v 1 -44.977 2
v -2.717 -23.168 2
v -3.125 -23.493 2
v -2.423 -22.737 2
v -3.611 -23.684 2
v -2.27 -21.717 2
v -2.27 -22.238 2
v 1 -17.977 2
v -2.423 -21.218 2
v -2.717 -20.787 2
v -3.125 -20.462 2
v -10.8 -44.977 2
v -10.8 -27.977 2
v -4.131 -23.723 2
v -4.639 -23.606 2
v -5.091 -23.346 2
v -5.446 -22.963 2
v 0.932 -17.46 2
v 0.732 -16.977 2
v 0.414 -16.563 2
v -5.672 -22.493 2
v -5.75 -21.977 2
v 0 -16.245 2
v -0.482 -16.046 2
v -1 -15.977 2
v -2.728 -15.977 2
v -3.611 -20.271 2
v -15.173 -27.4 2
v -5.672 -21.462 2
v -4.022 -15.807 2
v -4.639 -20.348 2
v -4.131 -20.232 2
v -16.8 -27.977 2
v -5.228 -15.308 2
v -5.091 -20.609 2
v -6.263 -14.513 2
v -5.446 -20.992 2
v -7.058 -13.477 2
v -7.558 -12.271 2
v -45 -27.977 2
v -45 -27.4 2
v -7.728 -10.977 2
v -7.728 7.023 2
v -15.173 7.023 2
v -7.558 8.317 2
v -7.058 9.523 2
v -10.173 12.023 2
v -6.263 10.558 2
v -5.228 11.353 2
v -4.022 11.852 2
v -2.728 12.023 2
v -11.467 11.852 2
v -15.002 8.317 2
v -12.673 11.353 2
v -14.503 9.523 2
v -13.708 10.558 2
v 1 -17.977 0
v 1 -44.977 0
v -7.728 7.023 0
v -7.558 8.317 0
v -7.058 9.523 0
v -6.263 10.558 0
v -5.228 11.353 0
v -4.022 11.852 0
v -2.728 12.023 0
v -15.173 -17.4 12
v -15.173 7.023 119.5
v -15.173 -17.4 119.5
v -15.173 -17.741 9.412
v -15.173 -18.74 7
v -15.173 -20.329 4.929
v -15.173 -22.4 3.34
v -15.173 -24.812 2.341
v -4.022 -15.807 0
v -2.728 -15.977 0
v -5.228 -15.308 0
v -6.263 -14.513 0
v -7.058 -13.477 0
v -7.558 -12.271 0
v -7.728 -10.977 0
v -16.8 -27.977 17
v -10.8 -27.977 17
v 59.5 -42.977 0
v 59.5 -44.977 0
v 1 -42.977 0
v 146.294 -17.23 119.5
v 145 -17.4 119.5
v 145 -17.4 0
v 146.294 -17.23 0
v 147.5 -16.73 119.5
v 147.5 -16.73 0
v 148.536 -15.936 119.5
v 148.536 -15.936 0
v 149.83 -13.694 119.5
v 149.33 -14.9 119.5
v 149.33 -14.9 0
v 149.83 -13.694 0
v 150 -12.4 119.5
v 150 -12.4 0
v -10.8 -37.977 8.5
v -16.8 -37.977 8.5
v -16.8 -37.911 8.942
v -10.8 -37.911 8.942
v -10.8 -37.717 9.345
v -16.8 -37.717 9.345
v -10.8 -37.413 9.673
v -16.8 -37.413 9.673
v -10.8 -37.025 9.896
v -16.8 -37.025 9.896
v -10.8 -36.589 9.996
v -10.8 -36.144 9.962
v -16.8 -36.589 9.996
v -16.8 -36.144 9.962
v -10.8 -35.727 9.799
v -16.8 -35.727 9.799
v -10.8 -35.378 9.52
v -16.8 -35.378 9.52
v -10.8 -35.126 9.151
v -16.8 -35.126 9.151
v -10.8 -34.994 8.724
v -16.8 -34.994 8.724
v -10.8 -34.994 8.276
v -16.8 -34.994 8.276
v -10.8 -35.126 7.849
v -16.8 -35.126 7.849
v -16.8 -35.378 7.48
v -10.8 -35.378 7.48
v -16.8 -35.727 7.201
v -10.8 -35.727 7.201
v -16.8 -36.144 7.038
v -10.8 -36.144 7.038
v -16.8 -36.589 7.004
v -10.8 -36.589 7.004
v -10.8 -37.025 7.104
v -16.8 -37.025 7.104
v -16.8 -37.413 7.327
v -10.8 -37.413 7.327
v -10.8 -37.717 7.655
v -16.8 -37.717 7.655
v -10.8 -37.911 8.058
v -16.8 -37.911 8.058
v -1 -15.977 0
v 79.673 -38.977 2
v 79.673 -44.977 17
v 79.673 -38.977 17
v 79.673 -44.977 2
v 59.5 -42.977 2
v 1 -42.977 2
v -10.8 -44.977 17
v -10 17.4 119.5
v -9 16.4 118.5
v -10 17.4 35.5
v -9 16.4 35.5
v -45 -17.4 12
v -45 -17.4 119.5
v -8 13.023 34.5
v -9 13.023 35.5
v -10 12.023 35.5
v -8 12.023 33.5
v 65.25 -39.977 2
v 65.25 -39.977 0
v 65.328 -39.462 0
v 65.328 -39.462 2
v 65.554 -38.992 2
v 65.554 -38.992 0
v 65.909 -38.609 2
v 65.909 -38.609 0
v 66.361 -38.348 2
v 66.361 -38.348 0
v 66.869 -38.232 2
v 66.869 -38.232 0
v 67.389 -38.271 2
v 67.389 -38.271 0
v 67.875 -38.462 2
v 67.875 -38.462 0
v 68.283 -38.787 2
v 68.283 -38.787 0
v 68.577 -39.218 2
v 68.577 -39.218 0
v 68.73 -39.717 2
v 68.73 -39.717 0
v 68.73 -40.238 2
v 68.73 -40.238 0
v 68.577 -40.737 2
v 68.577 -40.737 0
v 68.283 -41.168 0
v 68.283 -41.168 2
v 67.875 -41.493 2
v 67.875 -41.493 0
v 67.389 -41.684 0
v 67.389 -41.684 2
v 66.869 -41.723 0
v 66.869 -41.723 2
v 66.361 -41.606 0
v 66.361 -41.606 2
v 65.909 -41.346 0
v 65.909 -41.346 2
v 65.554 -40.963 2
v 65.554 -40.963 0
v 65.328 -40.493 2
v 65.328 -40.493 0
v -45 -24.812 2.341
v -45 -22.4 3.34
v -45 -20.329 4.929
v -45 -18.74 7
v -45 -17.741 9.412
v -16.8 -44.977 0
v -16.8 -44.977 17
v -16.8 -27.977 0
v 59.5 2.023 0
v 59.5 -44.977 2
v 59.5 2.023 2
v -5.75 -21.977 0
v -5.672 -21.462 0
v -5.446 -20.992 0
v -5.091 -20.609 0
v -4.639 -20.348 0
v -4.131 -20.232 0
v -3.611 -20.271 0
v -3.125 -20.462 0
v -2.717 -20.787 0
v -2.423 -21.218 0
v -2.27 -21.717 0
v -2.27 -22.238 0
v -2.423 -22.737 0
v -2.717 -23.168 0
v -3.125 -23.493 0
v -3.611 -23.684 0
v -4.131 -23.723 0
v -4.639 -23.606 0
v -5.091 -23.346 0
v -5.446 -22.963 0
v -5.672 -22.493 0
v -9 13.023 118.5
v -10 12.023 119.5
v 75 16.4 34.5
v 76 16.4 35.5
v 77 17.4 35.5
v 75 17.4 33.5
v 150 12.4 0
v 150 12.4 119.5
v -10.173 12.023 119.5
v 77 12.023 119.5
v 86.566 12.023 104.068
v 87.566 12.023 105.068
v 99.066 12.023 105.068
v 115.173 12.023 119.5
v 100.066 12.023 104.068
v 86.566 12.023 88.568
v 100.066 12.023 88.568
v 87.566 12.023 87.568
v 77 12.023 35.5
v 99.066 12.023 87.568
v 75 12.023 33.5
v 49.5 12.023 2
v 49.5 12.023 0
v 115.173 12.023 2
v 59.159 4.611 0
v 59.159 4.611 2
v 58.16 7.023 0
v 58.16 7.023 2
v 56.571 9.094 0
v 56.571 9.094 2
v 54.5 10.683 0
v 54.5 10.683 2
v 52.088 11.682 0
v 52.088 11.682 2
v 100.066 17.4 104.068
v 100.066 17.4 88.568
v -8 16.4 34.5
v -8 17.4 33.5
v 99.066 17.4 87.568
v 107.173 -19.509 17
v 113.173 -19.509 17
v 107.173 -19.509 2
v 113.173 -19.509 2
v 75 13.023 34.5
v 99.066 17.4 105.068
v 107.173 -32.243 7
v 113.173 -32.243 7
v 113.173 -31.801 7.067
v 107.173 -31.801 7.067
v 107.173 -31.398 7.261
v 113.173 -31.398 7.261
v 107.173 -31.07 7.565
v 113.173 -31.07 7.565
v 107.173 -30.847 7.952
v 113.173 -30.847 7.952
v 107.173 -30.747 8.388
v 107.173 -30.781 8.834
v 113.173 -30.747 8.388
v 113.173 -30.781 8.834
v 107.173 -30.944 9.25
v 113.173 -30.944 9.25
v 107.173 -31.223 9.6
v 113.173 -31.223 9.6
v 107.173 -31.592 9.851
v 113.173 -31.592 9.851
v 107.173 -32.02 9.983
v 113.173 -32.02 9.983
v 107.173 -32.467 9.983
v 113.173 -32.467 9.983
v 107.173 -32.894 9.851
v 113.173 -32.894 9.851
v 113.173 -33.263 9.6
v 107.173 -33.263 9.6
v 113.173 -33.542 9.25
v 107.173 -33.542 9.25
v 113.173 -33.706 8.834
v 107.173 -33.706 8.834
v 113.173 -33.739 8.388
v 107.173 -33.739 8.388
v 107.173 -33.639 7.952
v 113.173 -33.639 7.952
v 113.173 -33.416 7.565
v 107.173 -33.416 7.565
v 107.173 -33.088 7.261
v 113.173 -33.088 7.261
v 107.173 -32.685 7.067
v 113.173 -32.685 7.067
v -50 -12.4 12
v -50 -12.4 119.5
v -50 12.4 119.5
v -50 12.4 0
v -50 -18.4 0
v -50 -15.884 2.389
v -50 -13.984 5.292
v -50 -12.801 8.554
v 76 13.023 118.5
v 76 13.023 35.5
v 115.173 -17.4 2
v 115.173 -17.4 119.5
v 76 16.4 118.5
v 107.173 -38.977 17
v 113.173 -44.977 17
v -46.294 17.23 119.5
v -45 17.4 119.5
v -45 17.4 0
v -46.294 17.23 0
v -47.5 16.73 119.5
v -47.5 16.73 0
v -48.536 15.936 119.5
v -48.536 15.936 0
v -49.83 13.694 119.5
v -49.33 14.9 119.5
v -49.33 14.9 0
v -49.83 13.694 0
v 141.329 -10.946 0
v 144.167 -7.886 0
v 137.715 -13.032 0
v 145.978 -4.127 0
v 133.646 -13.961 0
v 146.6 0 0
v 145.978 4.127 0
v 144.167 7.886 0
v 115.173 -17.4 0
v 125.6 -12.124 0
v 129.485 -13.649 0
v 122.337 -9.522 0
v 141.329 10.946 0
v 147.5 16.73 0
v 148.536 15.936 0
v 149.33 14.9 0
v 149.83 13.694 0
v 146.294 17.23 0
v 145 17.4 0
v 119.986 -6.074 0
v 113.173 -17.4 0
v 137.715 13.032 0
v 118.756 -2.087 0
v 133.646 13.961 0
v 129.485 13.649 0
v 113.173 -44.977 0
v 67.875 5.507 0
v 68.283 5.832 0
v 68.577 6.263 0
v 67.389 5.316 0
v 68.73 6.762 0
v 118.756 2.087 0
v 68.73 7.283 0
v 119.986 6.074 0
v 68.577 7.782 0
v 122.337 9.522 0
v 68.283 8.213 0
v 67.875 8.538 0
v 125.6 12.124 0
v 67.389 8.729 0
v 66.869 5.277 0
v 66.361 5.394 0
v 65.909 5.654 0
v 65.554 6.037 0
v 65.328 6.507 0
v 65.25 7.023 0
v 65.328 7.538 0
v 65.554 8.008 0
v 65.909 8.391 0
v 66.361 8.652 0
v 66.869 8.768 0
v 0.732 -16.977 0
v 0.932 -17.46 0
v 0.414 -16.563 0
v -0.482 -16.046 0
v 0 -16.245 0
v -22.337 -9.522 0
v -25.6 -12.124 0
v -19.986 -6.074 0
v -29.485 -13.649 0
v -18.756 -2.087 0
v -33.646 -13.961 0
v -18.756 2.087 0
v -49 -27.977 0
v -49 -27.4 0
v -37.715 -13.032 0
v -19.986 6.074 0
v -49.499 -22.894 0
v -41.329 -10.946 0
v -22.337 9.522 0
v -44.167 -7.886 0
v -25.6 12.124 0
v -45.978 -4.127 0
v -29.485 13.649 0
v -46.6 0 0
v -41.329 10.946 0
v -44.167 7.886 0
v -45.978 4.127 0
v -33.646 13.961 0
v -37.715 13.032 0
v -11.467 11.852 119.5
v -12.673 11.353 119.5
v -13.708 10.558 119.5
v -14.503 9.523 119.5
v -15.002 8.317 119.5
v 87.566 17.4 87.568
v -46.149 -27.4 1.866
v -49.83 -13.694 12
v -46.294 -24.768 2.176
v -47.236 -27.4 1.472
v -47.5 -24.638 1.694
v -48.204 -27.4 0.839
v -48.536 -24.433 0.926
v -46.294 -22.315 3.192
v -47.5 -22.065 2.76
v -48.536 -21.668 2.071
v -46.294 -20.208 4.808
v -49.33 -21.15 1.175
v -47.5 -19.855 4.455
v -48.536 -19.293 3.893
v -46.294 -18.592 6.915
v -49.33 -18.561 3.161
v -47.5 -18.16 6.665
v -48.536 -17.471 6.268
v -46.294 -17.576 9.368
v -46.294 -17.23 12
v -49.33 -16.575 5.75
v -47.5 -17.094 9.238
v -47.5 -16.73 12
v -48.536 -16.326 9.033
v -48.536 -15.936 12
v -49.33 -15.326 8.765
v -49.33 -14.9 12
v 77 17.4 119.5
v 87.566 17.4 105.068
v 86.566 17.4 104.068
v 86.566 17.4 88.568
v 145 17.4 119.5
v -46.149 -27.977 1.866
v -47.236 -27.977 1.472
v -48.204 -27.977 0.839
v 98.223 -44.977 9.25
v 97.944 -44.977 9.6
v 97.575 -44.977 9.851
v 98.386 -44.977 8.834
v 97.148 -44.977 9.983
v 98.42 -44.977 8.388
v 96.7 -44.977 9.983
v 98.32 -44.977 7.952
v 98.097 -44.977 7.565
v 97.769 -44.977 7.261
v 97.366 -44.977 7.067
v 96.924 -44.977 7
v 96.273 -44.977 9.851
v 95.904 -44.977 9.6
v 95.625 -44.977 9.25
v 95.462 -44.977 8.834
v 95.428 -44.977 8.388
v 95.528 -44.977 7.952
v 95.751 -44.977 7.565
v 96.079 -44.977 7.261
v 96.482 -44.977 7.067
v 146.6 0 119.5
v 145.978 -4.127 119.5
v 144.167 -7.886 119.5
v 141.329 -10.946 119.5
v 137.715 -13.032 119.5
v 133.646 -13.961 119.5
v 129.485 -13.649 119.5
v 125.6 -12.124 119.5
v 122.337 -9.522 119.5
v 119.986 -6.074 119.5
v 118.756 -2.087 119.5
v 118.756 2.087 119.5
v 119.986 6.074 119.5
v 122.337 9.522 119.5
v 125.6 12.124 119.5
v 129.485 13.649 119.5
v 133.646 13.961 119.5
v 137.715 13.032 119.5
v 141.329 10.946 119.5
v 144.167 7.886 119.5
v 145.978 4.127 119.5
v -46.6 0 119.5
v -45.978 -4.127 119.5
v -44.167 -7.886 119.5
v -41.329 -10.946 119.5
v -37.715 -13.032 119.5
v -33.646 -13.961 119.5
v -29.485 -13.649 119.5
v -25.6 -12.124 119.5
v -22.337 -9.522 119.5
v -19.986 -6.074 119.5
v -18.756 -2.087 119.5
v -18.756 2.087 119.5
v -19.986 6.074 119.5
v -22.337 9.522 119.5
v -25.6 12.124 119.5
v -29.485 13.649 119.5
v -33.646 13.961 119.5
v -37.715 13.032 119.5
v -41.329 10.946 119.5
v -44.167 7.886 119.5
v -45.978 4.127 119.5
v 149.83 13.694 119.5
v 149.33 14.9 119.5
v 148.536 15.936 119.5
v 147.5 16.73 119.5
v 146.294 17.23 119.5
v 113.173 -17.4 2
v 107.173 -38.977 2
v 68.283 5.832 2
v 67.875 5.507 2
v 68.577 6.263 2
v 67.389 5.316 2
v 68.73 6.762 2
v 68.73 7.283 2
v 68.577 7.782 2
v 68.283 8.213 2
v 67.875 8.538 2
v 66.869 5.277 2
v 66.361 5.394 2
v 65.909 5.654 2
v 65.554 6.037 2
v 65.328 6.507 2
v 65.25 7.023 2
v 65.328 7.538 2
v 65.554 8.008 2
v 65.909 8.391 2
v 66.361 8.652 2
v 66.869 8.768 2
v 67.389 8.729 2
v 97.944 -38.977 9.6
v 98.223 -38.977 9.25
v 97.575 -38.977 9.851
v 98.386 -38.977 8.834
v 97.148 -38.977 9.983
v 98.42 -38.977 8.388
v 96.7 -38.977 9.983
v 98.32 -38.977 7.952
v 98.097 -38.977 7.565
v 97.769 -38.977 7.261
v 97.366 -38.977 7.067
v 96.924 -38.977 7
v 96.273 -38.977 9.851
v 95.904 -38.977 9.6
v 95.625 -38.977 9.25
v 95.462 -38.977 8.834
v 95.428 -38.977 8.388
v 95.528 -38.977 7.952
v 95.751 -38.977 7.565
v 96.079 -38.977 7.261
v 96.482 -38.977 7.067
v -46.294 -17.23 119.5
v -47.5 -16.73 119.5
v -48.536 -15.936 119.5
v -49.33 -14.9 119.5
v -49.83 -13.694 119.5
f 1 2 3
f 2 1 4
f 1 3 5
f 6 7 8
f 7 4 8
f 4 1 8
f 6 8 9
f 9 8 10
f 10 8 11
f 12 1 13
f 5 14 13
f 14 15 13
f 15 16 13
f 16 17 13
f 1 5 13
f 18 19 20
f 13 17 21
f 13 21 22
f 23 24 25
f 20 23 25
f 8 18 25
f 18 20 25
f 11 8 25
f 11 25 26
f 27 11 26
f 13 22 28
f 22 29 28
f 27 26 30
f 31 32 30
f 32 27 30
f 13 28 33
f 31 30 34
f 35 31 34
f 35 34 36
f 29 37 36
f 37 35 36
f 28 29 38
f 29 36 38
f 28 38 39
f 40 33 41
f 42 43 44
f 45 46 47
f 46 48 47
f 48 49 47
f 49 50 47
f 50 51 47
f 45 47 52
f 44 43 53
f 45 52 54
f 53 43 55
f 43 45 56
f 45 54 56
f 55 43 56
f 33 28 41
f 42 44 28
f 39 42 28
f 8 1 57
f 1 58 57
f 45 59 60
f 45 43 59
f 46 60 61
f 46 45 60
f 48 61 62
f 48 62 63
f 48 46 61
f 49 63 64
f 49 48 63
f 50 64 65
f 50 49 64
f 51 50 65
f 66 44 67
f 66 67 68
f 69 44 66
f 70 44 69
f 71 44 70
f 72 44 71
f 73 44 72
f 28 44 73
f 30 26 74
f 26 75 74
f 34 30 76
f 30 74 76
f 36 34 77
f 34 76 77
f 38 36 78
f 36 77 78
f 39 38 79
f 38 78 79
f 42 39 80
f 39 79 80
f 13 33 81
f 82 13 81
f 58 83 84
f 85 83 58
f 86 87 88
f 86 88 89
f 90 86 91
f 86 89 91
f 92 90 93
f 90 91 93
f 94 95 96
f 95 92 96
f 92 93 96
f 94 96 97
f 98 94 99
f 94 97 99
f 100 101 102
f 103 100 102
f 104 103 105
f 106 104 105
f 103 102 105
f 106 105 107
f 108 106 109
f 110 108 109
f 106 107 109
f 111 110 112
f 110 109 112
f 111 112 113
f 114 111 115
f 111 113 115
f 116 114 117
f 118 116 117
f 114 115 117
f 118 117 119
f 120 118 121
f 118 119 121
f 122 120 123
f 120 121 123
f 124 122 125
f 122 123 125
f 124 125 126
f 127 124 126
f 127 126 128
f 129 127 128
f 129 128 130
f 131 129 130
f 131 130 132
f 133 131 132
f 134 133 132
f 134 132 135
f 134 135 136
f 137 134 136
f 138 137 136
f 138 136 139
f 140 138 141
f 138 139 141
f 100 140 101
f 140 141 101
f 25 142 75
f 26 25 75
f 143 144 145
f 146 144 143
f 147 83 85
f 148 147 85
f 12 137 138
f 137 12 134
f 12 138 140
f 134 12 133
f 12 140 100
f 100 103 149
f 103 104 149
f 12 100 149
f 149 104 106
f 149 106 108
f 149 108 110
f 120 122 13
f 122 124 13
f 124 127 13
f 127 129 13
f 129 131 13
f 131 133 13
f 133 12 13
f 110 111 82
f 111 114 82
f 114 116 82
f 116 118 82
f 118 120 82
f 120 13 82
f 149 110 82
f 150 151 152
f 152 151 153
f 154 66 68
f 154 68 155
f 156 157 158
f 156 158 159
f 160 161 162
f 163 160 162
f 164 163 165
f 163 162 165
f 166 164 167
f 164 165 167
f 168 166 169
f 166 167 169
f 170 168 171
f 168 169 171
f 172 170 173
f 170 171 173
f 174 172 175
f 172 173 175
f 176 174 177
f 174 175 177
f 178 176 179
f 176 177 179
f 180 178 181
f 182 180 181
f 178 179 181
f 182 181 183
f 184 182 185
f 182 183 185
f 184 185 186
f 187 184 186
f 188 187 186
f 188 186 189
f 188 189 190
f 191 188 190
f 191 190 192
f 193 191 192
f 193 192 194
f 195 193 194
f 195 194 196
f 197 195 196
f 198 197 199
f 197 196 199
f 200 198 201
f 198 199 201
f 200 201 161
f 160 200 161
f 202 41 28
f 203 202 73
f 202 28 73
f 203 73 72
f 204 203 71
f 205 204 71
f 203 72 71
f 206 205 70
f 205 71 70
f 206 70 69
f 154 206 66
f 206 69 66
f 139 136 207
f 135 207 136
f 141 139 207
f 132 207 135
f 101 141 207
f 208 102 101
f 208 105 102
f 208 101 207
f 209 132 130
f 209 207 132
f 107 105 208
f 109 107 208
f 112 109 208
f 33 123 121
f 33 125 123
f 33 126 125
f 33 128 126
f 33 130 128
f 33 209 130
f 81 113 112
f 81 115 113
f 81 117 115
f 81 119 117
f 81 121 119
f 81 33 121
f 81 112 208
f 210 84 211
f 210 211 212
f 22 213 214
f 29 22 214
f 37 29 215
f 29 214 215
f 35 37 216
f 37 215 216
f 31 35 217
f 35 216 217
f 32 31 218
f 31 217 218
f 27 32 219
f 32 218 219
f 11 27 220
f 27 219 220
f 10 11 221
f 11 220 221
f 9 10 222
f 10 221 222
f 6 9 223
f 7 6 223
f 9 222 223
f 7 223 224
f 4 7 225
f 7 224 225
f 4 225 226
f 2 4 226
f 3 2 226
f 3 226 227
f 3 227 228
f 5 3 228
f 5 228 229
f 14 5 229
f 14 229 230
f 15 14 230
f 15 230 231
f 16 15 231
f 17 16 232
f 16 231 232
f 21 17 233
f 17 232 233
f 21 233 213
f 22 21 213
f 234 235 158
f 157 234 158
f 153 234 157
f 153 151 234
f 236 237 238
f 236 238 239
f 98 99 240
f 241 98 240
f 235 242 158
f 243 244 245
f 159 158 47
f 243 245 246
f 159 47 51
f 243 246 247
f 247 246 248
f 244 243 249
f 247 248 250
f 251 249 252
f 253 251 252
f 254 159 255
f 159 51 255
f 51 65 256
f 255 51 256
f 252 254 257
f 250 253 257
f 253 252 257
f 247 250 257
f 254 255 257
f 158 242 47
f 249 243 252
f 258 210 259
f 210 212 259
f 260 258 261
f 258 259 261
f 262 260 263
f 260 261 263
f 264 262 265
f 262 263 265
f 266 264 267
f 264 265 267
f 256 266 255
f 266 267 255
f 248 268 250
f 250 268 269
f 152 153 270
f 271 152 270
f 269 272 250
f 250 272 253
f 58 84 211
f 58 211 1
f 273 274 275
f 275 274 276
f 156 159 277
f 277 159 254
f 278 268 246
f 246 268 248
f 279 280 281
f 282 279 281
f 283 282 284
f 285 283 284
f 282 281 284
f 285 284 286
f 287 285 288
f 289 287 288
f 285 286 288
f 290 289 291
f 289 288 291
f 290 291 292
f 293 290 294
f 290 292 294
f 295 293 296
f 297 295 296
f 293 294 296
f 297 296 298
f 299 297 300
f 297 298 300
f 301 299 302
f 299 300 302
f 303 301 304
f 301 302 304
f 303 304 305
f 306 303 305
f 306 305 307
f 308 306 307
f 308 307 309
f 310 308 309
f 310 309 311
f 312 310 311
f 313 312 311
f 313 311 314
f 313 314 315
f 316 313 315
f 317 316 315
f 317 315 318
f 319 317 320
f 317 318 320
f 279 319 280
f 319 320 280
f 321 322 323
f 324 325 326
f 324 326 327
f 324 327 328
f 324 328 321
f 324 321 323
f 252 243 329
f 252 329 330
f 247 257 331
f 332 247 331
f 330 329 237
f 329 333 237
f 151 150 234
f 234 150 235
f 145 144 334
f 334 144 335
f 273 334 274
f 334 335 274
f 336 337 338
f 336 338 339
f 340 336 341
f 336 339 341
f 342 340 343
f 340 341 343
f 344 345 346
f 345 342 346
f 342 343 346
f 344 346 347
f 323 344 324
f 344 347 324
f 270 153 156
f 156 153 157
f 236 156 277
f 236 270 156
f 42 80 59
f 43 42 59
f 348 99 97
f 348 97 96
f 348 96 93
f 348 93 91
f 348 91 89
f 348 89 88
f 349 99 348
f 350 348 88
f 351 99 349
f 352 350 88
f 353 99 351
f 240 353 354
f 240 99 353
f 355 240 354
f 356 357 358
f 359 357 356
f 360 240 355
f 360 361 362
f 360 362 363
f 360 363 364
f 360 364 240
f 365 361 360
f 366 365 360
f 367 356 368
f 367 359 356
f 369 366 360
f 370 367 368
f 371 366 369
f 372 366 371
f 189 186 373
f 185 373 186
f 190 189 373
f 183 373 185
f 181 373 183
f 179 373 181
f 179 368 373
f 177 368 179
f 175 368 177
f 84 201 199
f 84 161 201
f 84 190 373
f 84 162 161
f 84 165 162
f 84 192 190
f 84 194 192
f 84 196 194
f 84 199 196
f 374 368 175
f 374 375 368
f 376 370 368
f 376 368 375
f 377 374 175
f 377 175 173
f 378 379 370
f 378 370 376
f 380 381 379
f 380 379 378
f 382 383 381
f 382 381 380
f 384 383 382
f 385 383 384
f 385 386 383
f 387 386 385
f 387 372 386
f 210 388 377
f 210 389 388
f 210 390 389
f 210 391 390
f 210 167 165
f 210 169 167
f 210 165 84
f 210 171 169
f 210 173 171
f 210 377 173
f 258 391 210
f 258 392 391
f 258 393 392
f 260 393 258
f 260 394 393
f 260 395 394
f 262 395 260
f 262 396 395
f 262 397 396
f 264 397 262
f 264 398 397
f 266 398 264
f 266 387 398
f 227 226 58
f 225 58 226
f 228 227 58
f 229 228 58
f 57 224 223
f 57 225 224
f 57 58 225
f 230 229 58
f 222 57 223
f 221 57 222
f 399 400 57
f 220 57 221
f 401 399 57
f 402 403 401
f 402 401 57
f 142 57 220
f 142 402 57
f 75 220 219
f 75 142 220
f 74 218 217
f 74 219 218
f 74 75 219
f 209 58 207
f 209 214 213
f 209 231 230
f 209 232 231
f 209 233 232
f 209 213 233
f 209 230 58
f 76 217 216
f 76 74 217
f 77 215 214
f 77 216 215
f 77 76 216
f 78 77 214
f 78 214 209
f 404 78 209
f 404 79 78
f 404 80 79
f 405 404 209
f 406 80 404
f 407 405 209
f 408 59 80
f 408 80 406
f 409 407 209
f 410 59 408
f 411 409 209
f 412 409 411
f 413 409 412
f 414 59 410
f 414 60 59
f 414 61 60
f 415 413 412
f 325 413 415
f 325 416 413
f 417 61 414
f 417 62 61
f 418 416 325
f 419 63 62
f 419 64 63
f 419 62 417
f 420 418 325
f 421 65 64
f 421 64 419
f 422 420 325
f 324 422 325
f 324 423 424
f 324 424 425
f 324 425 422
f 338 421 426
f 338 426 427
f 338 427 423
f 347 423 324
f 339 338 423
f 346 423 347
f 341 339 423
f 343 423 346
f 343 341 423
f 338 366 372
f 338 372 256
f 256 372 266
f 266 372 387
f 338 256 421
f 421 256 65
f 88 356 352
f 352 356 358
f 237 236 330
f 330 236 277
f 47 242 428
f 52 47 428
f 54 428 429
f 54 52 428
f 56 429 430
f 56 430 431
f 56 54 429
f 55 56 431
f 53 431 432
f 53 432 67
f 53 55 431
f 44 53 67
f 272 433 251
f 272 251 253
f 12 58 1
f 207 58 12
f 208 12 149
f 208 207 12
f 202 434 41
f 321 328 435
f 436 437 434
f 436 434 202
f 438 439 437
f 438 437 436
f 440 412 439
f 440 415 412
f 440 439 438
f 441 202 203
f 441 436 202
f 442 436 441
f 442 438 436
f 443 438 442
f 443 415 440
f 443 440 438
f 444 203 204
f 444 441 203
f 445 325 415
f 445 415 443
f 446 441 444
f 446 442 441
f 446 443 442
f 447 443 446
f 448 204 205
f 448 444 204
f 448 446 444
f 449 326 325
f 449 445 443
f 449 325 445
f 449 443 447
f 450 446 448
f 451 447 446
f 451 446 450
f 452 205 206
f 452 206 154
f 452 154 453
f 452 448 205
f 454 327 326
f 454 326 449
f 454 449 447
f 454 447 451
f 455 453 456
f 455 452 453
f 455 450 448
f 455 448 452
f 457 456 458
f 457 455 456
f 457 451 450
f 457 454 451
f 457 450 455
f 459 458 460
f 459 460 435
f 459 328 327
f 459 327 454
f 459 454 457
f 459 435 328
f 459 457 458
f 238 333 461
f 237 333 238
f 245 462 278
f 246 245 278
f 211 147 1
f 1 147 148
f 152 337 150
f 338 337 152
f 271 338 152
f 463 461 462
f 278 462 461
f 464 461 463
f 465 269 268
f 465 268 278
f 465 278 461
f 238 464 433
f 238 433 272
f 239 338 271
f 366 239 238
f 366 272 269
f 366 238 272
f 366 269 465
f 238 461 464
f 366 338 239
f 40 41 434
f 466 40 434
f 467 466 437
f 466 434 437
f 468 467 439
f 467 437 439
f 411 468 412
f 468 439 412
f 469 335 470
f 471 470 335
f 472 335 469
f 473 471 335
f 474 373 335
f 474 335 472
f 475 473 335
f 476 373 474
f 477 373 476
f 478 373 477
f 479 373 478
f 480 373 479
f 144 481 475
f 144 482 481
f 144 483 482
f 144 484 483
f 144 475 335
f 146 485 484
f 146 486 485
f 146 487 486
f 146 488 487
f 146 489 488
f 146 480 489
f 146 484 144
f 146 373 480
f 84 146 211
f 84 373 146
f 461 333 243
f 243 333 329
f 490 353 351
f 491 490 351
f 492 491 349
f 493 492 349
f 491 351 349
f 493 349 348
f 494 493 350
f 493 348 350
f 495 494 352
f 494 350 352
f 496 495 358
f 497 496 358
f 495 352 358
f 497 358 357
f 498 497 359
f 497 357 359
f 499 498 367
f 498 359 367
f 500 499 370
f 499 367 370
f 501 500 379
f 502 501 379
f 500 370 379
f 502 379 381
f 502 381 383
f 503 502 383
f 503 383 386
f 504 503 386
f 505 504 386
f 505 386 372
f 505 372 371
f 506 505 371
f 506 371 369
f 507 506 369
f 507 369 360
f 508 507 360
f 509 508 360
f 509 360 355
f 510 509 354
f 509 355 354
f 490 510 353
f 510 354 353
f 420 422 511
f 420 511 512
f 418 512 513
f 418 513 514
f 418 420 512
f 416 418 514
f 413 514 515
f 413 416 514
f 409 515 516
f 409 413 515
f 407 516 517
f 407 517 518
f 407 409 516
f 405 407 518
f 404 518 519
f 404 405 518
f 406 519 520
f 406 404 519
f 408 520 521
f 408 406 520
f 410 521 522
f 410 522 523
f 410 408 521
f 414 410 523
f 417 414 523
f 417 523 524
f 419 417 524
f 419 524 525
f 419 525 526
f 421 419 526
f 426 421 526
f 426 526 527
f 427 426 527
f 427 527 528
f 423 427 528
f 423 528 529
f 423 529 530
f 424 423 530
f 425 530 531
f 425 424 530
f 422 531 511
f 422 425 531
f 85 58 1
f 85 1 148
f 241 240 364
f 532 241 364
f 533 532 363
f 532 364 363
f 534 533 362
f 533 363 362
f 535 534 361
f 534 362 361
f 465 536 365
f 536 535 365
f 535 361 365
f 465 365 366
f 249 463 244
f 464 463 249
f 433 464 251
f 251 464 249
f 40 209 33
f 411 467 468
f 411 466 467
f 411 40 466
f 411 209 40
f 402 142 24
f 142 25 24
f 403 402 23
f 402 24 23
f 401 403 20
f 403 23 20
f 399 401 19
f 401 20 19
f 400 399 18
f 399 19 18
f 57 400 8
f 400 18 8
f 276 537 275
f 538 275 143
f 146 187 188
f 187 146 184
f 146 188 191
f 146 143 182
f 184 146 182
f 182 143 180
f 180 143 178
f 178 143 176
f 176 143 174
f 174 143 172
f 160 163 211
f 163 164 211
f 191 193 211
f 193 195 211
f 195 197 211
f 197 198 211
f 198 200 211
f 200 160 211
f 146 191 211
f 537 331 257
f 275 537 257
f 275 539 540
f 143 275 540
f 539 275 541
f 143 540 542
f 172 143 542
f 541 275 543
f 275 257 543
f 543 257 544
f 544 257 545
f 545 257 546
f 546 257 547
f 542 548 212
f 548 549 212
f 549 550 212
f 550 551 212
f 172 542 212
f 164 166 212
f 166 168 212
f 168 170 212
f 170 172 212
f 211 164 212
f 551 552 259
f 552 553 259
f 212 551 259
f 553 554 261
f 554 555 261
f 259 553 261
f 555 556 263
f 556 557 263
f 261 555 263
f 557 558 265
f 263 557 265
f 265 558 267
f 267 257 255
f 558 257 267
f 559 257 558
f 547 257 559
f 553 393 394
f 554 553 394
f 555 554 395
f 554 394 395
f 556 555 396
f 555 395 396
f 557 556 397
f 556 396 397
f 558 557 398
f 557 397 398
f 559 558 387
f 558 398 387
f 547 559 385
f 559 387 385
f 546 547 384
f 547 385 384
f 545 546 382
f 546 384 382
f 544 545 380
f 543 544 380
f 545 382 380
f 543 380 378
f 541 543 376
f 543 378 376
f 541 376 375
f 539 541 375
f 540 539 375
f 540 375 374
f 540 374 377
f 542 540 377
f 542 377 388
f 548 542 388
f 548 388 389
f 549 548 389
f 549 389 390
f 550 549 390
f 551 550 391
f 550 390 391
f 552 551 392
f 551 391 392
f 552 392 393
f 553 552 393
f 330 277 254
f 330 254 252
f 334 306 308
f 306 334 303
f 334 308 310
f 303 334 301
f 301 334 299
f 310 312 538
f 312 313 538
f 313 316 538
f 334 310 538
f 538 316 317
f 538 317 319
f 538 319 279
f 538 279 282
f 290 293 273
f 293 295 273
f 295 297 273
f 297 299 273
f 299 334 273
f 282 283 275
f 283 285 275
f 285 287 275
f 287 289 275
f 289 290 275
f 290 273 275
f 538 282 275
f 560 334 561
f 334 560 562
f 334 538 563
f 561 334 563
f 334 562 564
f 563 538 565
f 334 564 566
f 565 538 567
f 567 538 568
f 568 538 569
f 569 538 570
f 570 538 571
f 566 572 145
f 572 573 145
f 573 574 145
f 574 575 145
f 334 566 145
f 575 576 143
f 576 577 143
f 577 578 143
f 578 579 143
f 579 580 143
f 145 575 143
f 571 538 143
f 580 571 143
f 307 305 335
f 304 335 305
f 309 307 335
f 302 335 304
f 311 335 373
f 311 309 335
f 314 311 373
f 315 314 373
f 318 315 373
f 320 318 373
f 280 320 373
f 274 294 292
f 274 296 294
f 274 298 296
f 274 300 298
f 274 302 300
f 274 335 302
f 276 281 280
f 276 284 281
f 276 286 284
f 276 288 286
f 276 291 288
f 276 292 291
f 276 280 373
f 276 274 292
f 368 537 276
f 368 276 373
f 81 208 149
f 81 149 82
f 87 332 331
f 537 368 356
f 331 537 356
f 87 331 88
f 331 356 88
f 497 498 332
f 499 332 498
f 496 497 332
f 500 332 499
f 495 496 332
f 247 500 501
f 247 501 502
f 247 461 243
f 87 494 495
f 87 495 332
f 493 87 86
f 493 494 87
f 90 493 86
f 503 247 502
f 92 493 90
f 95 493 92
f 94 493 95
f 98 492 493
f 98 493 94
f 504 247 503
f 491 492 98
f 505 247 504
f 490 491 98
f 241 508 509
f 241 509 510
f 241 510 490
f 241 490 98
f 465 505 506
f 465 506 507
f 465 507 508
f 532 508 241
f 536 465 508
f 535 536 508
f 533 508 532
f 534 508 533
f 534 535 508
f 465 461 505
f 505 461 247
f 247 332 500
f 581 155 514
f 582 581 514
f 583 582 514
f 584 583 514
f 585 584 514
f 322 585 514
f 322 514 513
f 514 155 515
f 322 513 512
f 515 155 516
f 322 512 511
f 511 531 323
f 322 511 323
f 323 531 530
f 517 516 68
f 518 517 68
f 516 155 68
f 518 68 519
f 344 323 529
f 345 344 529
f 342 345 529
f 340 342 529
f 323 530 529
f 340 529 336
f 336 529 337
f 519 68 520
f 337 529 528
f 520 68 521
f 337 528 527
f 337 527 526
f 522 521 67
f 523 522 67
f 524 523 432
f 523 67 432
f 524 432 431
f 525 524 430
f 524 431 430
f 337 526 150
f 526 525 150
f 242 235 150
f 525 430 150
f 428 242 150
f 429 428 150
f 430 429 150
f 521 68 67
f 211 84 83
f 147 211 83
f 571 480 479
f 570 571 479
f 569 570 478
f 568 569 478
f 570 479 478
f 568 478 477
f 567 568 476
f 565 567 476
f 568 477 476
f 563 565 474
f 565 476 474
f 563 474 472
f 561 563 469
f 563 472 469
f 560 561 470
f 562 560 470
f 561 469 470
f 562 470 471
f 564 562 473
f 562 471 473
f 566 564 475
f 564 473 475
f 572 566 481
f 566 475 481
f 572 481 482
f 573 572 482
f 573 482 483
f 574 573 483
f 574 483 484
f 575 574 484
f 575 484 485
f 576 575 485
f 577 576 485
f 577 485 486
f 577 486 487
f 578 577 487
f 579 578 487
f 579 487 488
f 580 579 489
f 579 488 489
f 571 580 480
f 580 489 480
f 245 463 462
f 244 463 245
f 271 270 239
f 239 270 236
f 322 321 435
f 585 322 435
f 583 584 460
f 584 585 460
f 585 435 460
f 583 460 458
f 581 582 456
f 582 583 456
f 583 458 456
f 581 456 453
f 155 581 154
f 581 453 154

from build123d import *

# Parameters (mm, degrees)
SKETCH1_R            = 14
BOSS_EXTRUDE1_DEPTH  = 119.5
SKETCH5_W            = 85
SKETCH5_H            = 85
CUT_EXTRUDE2_DEPTH   = 10
CHAMFER2_SIZE        = 1
SKETCH6_W            = 15
SKETCH6_H            = 57
SKETCH6_W_2          = 51
SKETCH6_H_2          = 12
BOSS_EXTRUDE3_DEPTH  = 2
SKETCH7_R            = 1.75
CUT_EXTRUDE3_DEPTH   = 2
FILLET1_R            = 10
FILLET2_R            = 10
SKETCH8_W            = 13.5
SKETCH8_H            = 17.5
CUT_EXTRUDE4_DEPTH   = 10
CHAMFER4_SIZE        = 1
SKETCH10_W           = 9.140808063
SKETCH10_H           = 30.26858539
BOSS_EXTRUDE4_DEPTH  = 2
FILLET3_R            = 5
FILLET4_R            = 5
FILLET5_R            = 5
SKETCH11_W           = 40.67275181
SKETCH11_H           = 57
BOSS_EXTRUDE5_DEPTH  = 2
SKETCH13_W           = 35.5
SKETCH13_H           = 15
BOSS_EXTRUDE6_DEPTH  = 6
SKETCH14_W           = 2
SKETCH14_H           = 27.577394829
CUT_EXTRUDE5_DEPTH   = 17
SKETCH15_W           = 17.8
SKETCH15_H           = 17
BOSS_EXTRUDE7_DEPTH  = 2
SKETCH16_W           = 15
SKETCH16_H           = 17
BOSS_EXTRUDE8_DEPTH  = 6
FILLET6_R            = 2
SKETCH17_W           = 58.5
SKETCH17_H           = 2
BOSS_EXTRUDE9_DEPTH  = 2
SKETCH18_W           = 15
SKETCH18_H           = 19.468455061
BOSS_EXTRUDE10_DEPTH = 6
SKETCH19_R           = 1.5
CUT_EXTRUDE6_DEPTH   = 6
SKETCH21_R           = 1.5
CUT_EXTRUDE7_DEPTH   = 6
SKETCH22_R           = 1.5
CUT_EXTRUDE8_DEPTH   = 6


with BuildPart() as part:
    # Sketch1 → Boss-Extrude1 (new body)
    with BuildSketch(Plane.XY):
        Polygon((-50, 17.4), (-15.2, 17.4), (50, 17.4), (50, 12.022605171), (-15.17275181, 12.022605171), (-15.17275181, -17.4), (-50, -17.4), align=None)
        with Locations(Location((-32.6, 0, 0), (0, 0, 180))):
            Circle(SKETCH1_R, mode=Mode.SUBTRACT)
    boss_extrude1 = extrude(amount=BOSS_EXTRUDE1_DEPTH)

    # Mirror1: Boss-Extrude1 across plane
    add(boss_extrude1.mirror(Plane(origin=(50, 17.4, 119.5), x_dir=(0, 0, 1), z_dir=(-1, 0, 0))))

    # Sketch5 → Cut-Extrude2 (cut)
    with BuildSketch(Plane(origin=(0, 17.4, 0), x_dir=(1, 0, 0), z_dir=(0, 1, 0))):
        with Locations((33.5, -77)):
            Rectangle(SKETCH5_W, SKETCH5_H)
    extrude(amount=-CUT_EXTRUDE2_DEPTH, mode=Mode.SUBTRACT)

    # Chamfer2
    chamfer2_edges = [part.edges().sort_by_distance(p)[0] for p in [
        (-9, 12.022605171, 77),
        (-9, 14.711302586, 119.5),
        (33.5, 12.022605171, 34.5),
        (-9, 14.711302586, 34.5),
        (76, 12.022605171, 77),
        (76, 14.711302586, 34.5),
        (76, 14.711302586, 119.5),
        (-9, 17.4, 77),
        (76, 17.4, 77),
        (33.5, 17.4, 34.5),
    ]]
    chamfer(chamfer2_edges, length=CHAMFER2_SIZE)

    # Sketch6 → Boss-Extrude3 (add)
    with BuildSketch(Plane(origin=(0, 0, 0), x_dir=(-1, 0, 0), z_dir=(0, 0, -1))):
        with Locations((-67, -16.477394829)):
            Rectangle(SKETCH6_W, SKETCH6_H)
        with Locations((24.5, -21.977394829)):
            Rectangle(SKETCH6_W_2, SKETCH6_H_2)
    extrude(amount=-BOSS_EXTRUDE3_DEPTH)

    # Sketch7 → Cut-Extrude3 (cut)
    with BuildSketch(Plane(origin=(0, 0, 0), x_dir=(-1, 0, 0), z_dir=(0, 0, -1))):
        with Locations((4, -21.977394829)):
            Circle(SKETCH7_R)
        with Locations((-67, 7.022605171)):
            Circle(SKETCH7_R)
        with Locations((-67, -39.977394829)):
            Circle(SKETCH7_R)
    extrude(amount=-CUT_EXTRUDE3_DEPTH, mode=Mode.SUBTRACT)

    # Fillet1
    fillet1_edges = [part.edges().sort_by_distance(p)[0] for p in [
        (-32.586375905, -17.4, 2),
    ]]
    fillet(fillet1_edges, radius=FILLET1_R)

    # Fillet2
    fillet2_edges = [part.edges().sort_by_distance(p)[0] for p in [
        (59.5, 12.022605171, 1),
    ]]
    fillet(fillet2_edges, radius=FILLET2_R)

    # Sketch8 → Cut-Extrude4 (cut)
    with BuildSketch(Plane(origin=(0, 17.4, 0), x_dir=(1, 0, 0), z_dir=(0, 1, 0))):
        with Locations((93.315639073, -96.31798342)):
            Rectangle(SKETCH8_W, SKETCH8_H)
    extrude(amount=-CUT_EXTRUDE4_DEPTH, mode=Mode.SUBTRACT)

    # Chamfer4
    chamfer4_edges = [part.edges().sort_by_distance(p)[0] for p in [
        (86.565639073, 14.711302586, 105.06798342),
        (86.565639073, 14.711302586, 87.56798342),
        (100.065639073, 14.711302586, 87.56798342),
        (100.065639073, 14.711302586, 105.06798342),
    ]]
    chamfer(chamfer4_edges, length=CHAMFER4_SIZE)

    # Sketch10 → Boss-Extrude4 (add)
    with BuildSketch(Plane(origin=(0, 0, 0), x_dir=(-1, 0, 0), z_dir=(0, 0, -1))):
        with Locations((12.298347732, -2.03609998)):
            Rectangle(SKETCH10_W, SKETCH10_H)
    extrude(amount=-BOSS_EXTRUDE4_DEPTH)

    # Fillet3
    fillet3_edges = [part.edges().sort_by_distance(p)[0] for p in [
        (-7.7279437, -15.977394829, 1),
    ]]
    fillet(fillet3_edges, radius=FILLET3_R)

    # Fillet4
    fillet4_edges = [part.edges().sort_by_distance(p)[0] for p in [
        (-7.7279437, 12.022605171, 1),
    ]]
    fillet(fillet4_edges, radius=FILLET4_R)

    # Fillet5
    # the kernel refuses this fillet: 5 mm, written as the material it adds along each edge
    with BuildSketch(Plane(origin=(-15.17275181, 12.022605171, 2), x_dir=(0, -1, 0), z_dir=(0, 0, 1))) as fillet5_piece_1:
        with BuildLine():
            CenterArc((FILLET5_R, FILLET5_R), FILLET5_R, 180, 90)
            Line((0, FILLET5_R), (0, 0))
            Line((0, 0), (FILLET5_R, 0))
        make_face()
    extrude(amount=117.5)
    # the kernel refuses this fillet: 5 mm, written as the material it takes off along each edge
    with BuildSketch(Plane(origin=(150, 17.4, -12.5), x_dir=(-1, 0, 0), z_dir=(0, 0, 1)), Plane(origin=(150, -17.4, -12.5), x_dir=(0, 1, 0), z_dir=(0, 0, 1)), Plane(origin=(-50, 17.4, -12.5), x_dir=(0, -1, 0), z_dir=(0, 0, 1))) as fillet5_2_piece_1:
        with BuildLine():
            CenterArc((FILLET5_R, FILLET5_R), FILLET5_R, 180, 90)
            Line((0, FILLET5_R), (0, 0))
            Line((0, 0), (FILLET5_R, 0))
        make_face()
    extrude(amount=144.5, mode=Mode.SUBTRACT)
    with BuildSketch(Plane(origin=(-50, -27.4, 2), x_dir=(0, 0, -1), z_dir=(0, -1, 0))) as fillet5_2_piece_2:
        with BuildLine():
            CenterArc((FILLET5_R, FILLET5_R), FILLET5_R, 180, 90)
            Line((0, FILLET5_R), (0, 0))
            Line((0, 0), (FILLET5_R, 0))
        make_face()
    extrude(amount=13.077394829, mode=Mode.SUBTRACT)
    with BuildSketch(Plane(origin=(-50, -27.4, 12), x_dir=(0, 0, -1), z_dir=(0, -1, 0))) as fillet5_2_piece_3:
        with BuildLine():
            CenterArc((10 + FILLET5_R, FILLET5_R), FILLET5_R, 180, 90)
            Line((10, FILLET5_R), (10, 0))
            Line((10, 0), (10 + FILLET5_R, 0))
        make_face()
    revolve(axis=Axis((-50, -27.4, 12), (1, 0, 0)), revolution_arc=90, mode=Mode.SUBTRACT)
    with BuildSketch(Plane(origin=(-50, -17.4, 12), x_dir=(0, 1, 0), z_dir=(0, 0, 1))) as fillet5_2_piece_4:
        with BuildLine():
            CenterArc((FILLET5_R, -FILLET5_R), FILLET5_R, 90, 90)
            Line((0, -FILLET5_R), (0, 0))
            Line((0, 0), (FILLET5_R, 0))
        make_face()
    extrude(amount=120, mode=Mode.SUBTRACT)

    # Sketch11 → Boss-Extrude5 (add)
    with BuildSketch(Plane(origin=(0, 0, 0), x_dir=(-1, 0, 0), z_dir=(0, 0, -1))):
        with Locations((-94.836375905, -16.477394829)):
            Rectangle(SKETCH11_W, SKETCH11_H)
    extrude(amount=-BOSS_EXTRUDE5_DEPTH)

    # Sketch13 → Boss-Extrude6 (add)
    with BuildSketch(Plane(origin=(0, -44.977394829, 0), x_dir=(-1, 0, 0), z_dir=(0, -1, 0))):
        with Locations((-97.42275181, -9.5)):
            Rectangle(SKETCH13_W, SKETCH13_H)
    extrude(amount=-BOSS_EXTRUDE6_DEPTH)

    # Sketch14 → Cut-Extrude5 (cut)
    with BuildSketch(Plane(origin=(0, 0, 0), x_dir=(-1, 0, 0), z_dir=(0, 0, -1))):
        with Locations((-114.17275181, -31.188697415)):
            Rectangle(SKETCH14_W, SKETCH14_H)
    extrude(amount=-CUT_EXTRUDE5_DEPTH, mode=Mode.SUBTRACT)

    # Sketch15 → Boss-Extrude7 (add)
    with BuildSketch(Plane(origin=(0, 0, 0), x_dir=(-1, 0, 0), z_dir=(0, 0, -1))):
        with Locations((7.9, -36.477394829)):
            Rectangle(SKETCH15_W, SKETCH15_H)
    extrude(amount=-BOSS_EXTRUDE7_DEPTH)

    # Sketch16 → Boss-Extrude8 (add)
    with BuildSketch(Plane.ZY.offset(16.8)):
        with Locations((9.5, -36.477394829)):
            Rectangle(SKETCH16_W, SKETCH16_H)
    extrude(amount=-BOSS_EXTRUDE8_DEPTH)

    # Fillet6
    fillet6_edges = [part.edges().sort_by_distance(p)[0] for p in [
        (1, -15.977394829, 1),
    ]]
    fillet(fillet6_edges, radius=FILLET6_R)

    # Sketch18 → Boss-Extrude10 (add)
    with BuildSketch(Plane(origin=(113.17275181, 0, 0), x_dir=(0, 0, -1), z_dir=(1, 0, 0))):
        with Locations((-9.5, -29.243167299)):
            Rectangle(SKETCH18_W, SKETCH18_H)
    extrude(amount=-BOSS_EXTRUDE10_DEPTH)

    # Sketch19 → Cut-Extrude6 (cut)
    with BuildSketch(Plane(origin=(113.17275181, 0, 0), x_dir=(0, 0, -1), z_dir=(1, 0, 0))):
        with Locations((-8.5, -32.243167298)):
            Circle(SKETCH19_R)
    extrude(amount=-CUT_EXTRUDE6_DEPTH, mode=Mode.SUBTRACT)

    # Sketch21 → Cut-Extrude7 (cut)
    with BuildSketch(Plane.XZ.offset(44.977394829)):
        with Locations(Location((96.923969756, 8.5, 0), (0, 0, 270))):
            Circle(SKETCH21_R)
    extrude(amount=-CUT_EXTRUDE7_DEPTH, mode=Mode.SUBTRACT)

    # Sketch22 → Cut-Extrude8 (cut)
    with BuildSketch(Plane.ZY.offset(16.8)):
        with Locations(Location((8.5, -36.477394829, 0), (0, 0, 270))):
            Circle(SKETCH22_R)
    extrude(amount=-CUT_EXTRUDE8_DEPTH, mode=Mode.SUBTRACT)


with BuildPart() as body_2:
    # Sketch17 → Boss-Extrude9 (new body)
    with BuildSketch(Plane(origin=(0, 0, 0), x_dir=(-1, 0, 0), z_dir=(0, 0, -1))):
        with Locations((-30.25, -43.977394829)):
            Rectangle(SKETCH17_W, SKETCH17_H)
    extrude(amount=-BOSS_EXTRUDE9_DEPTH)


solid = Compound([part.part, body_2.part])
